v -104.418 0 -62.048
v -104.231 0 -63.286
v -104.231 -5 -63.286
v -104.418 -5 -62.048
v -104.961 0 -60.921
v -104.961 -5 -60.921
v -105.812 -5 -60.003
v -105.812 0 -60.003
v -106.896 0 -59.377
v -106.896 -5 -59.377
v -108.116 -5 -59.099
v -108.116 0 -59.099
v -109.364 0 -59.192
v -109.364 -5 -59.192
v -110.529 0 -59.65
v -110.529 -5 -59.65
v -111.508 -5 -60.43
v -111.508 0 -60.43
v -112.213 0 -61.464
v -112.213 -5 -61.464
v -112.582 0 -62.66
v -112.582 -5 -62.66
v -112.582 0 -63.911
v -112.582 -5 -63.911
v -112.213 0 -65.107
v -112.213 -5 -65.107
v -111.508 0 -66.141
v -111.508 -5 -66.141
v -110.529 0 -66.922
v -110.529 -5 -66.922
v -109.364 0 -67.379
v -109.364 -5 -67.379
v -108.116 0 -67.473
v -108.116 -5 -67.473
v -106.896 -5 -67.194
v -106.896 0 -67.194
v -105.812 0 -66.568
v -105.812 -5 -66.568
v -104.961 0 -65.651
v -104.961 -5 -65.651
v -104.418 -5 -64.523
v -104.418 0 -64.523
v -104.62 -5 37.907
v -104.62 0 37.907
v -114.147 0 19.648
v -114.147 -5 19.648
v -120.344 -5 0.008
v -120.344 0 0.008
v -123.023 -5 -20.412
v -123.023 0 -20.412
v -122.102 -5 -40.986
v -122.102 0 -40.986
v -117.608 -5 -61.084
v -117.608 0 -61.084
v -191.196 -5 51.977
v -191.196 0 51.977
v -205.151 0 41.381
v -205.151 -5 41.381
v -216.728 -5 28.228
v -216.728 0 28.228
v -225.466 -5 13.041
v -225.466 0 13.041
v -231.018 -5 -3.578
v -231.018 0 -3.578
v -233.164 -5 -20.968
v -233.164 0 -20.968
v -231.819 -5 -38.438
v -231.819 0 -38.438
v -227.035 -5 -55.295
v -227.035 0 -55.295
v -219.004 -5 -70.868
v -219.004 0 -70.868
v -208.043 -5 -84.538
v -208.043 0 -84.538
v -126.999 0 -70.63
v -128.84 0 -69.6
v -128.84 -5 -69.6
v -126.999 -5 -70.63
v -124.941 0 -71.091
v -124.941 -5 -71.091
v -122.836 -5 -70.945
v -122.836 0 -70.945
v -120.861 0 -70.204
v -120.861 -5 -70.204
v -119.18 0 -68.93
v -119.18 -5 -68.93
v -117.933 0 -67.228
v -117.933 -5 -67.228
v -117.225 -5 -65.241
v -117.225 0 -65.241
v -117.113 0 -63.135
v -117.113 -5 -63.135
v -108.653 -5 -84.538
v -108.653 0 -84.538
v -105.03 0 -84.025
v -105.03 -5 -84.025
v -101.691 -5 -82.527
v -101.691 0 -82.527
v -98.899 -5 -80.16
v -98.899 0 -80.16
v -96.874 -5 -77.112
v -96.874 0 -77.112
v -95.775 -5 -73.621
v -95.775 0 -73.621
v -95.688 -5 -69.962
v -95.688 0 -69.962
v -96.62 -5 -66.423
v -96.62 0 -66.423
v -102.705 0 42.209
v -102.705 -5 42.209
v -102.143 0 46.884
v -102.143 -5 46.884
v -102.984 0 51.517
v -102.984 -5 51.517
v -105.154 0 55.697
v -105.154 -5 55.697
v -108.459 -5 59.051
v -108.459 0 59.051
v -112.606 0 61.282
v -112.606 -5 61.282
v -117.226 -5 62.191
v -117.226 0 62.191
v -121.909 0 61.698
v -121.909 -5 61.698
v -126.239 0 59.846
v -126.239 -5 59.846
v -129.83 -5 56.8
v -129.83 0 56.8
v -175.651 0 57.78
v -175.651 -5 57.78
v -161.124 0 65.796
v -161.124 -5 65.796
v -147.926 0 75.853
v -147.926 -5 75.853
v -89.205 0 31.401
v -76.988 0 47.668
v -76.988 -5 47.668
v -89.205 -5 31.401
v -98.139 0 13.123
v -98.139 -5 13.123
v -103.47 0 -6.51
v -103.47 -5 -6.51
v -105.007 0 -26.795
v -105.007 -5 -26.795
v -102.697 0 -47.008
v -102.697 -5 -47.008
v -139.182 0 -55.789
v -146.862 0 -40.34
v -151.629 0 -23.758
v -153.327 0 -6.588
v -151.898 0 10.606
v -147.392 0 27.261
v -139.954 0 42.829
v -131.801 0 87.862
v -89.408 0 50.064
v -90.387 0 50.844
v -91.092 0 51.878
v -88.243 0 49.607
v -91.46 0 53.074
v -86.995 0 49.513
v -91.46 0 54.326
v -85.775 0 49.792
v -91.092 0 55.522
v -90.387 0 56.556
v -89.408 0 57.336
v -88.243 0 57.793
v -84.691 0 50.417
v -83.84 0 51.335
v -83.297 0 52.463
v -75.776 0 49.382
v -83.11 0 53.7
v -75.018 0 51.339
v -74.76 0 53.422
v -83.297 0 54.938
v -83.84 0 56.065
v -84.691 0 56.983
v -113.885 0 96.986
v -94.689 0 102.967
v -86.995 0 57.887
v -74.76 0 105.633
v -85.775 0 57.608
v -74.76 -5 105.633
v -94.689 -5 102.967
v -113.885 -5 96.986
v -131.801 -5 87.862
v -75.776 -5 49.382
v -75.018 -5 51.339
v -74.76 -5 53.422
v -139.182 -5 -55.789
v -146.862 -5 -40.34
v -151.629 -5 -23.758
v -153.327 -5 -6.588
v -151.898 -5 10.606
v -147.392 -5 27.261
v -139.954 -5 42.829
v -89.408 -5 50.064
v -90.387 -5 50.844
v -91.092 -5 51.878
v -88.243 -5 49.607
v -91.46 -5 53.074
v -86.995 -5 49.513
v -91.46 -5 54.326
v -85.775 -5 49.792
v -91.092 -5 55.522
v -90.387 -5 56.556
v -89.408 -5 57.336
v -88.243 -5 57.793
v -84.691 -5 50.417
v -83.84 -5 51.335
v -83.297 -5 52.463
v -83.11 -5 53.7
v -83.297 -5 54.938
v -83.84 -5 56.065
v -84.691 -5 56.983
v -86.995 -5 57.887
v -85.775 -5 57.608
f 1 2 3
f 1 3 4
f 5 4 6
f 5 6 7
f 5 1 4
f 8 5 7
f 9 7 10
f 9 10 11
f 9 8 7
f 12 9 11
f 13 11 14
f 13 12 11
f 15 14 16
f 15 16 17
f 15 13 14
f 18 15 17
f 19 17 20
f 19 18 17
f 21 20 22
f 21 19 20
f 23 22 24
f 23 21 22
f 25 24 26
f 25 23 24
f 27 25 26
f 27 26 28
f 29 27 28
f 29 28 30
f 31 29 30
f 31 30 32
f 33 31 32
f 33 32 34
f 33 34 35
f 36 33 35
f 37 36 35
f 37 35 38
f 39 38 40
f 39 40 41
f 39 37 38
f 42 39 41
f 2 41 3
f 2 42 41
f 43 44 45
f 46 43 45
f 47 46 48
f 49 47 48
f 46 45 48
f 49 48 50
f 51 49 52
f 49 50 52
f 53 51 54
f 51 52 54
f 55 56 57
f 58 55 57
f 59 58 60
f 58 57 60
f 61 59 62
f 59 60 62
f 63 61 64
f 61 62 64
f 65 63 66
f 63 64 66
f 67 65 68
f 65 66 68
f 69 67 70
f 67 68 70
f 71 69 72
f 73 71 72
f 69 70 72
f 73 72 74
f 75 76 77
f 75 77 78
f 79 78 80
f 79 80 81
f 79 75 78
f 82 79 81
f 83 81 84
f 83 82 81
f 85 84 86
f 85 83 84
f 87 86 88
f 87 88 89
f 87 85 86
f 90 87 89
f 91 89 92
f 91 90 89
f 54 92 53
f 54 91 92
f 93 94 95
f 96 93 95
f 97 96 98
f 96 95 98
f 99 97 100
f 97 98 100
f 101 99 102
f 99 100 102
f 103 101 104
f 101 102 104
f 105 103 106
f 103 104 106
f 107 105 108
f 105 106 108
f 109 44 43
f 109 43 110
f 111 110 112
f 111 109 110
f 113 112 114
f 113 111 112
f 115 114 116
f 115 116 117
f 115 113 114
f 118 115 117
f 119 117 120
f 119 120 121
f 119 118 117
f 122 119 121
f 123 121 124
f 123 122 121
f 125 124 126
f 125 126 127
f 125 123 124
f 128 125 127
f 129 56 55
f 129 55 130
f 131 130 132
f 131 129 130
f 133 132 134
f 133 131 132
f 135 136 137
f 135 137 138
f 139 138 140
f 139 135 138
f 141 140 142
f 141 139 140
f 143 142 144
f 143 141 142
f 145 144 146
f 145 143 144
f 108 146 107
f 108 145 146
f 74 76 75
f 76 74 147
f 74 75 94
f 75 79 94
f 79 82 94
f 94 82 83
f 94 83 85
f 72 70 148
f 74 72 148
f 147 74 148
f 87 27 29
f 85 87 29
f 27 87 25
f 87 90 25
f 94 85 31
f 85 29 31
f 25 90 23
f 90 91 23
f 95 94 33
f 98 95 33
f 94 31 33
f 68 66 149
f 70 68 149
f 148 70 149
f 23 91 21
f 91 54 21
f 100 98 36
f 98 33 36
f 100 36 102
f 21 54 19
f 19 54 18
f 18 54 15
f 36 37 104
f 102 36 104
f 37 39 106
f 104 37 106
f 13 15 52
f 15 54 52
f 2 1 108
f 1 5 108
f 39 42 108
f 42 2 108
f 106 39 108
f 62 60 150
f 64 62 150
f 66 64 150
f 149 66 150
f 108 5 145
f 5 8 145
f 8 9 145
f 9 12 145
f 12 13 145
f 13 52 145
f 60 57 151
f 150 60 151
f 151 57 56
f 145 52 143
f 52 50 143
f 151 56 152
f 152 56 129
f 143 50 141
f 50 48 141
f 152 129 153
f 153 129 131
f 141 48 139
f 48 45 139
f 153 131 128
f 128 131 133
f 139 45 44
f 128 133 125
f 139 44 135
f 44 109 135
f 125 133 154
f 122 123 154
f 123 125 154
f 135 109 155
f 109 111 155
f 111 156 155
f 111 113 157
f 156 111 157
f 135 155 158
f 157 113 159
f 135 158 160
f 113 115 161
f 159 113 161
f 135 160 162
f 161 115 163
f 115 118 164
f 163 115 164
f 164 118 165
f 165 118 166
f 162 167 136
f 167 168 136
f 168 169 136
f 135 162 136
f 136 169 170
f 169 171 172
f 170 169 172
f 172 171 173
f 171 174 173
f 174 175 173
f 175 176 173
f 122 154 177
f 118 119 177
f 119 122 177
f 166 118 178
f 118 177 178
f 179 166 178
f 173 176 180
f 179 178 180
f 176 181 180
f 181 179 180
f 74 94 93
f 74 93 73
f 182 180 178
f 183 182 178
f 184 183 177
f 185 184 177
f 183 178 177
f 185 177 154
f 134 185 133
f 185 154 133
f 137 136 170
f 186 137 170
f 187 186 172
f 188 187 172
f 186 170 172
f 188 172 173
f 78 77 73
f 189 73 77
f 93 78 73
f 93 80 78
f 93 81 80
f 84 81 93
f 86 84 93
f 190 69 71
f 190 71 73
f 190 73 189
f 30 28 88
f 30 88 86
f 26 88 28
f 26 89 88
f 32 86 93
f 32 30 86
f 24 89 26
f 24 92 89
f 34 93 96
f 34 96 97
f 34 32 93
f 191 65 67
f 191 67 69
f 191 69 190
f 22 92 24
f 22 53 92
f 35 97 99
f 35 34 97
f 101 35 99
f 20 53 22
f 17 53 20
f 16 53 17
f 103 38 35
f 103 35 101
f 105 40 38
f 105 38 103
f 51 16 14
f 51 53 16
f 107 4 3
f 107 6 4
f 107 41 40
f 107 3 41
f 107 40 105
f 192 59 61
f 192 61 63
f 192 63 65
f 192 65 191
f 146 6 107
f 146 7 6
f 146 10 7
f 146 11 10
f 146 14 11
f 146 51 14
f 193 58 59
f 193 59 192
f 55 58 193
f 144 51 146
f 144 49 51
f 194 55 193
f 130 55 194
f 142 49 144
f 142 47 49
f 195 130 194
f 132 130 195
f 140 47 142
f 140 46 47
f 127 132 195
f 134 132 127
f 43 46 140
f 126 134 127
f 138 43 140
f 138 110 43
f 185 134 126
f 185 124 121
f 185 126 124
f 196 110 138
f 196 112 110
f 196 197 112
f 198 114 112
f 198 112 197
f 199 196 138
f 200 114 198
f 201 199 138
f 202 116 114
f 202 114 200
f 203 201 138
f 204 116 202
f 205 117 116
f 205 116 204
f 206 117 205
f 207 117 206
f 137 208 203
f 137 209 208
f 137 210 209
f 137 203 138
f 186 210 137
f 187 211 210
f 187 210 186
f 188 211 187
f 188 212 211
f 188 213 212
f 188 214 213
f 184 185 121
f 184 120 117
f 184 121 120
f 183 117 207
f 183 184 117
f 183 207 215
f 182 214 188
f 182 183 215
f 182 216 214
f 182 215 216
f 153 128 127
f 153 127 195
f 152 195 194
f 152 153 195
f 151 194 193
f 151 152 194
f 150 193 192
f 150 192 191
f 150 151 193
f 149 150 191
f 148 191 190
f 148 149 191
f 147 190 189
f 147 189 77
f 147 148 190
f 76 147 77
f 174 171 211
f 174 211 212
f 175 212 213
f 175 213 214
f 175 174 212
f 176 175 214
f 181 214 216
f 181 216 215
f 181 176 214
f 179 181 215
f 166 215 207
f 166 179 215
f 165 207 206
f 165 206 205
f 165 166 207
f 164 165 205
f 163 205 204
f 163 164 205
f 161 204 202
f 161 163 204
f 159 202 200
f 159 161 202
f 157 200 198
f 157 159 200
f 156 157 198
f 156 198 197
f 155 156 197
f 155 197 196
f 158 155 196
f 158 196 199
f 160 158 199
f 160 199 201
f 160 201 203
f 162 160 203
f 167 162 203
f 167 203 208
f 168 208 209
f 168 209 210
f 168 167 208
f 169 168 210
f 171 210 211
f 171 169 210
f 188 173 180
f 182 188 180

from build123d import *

# Parameters (mm, degrees)
SKETCH_R  = 4.19854
PAD_DEPTH = 5


with BuildPart() as part:
    # Sketch → Pad (new body)
    with BuildSketch(Plane.XZ):
        with BuildLine():
            Line((-74.76046, 53.421562), (-74.76046, 105.632532))
            ThreePointArc((-74.76046, 105.632532), (-113.884518, 96.986251), (-147.92625, 75.853087))
            ThreePointArc((-191.195978, 51.976961), (-168.240252, 61.521279), (-147.92625, 75.853087))
            ThreePointArc((-191.195978, 51.976961), (-232.525307, -12.219718), (-208.043261, -84.538155))
            Line((-108.653475, -84.538155), (-208.043261, -84.538155))
            ThreePointArc((-108.653475, -84.538155), (-97.779522, -78.707083), (-96.619688, -66.422986))
            ThreePointArc((-76.988182, 47.66843), (-103.469883, -6.509598), (-96.619688, -66.422986))
            ThreePointArc((-76.988182, 47.66843), (-75.336834, 50.336871), (-74.76046, 53.421562))
        make_face()
        with Locations((-108.43, -63.28574)):
            Circle(SKETCH_R, mode=Mode.SUBTRACT)
        with Locations((-87.308784, 53.70005)):
            Circle(SKETCH_R, mode=Mode.SUBTRACT)
        with BuildLine():
            ThreePointArc((-129.83, 56.8), (-153.326605, -6.587909), (-128.84, -69.6))
            ThreePointArc((-128.84, -69.6), (-119.974424, -69.628015), (-117.608236, -61.08399))
            ThreePointArc((-104.620375, 37.907127), (-122.131275, -10.14298), (-117.608236, -61.08399))
            ThreePointArc((-104.620375, 37.907127), (-108.458862, 59.050873), (-129.83, 56.8))
        make_face(mode=Mode.SUBTRACT)
    extrude(amount=PAD_DEPTH)


solid = part.part
